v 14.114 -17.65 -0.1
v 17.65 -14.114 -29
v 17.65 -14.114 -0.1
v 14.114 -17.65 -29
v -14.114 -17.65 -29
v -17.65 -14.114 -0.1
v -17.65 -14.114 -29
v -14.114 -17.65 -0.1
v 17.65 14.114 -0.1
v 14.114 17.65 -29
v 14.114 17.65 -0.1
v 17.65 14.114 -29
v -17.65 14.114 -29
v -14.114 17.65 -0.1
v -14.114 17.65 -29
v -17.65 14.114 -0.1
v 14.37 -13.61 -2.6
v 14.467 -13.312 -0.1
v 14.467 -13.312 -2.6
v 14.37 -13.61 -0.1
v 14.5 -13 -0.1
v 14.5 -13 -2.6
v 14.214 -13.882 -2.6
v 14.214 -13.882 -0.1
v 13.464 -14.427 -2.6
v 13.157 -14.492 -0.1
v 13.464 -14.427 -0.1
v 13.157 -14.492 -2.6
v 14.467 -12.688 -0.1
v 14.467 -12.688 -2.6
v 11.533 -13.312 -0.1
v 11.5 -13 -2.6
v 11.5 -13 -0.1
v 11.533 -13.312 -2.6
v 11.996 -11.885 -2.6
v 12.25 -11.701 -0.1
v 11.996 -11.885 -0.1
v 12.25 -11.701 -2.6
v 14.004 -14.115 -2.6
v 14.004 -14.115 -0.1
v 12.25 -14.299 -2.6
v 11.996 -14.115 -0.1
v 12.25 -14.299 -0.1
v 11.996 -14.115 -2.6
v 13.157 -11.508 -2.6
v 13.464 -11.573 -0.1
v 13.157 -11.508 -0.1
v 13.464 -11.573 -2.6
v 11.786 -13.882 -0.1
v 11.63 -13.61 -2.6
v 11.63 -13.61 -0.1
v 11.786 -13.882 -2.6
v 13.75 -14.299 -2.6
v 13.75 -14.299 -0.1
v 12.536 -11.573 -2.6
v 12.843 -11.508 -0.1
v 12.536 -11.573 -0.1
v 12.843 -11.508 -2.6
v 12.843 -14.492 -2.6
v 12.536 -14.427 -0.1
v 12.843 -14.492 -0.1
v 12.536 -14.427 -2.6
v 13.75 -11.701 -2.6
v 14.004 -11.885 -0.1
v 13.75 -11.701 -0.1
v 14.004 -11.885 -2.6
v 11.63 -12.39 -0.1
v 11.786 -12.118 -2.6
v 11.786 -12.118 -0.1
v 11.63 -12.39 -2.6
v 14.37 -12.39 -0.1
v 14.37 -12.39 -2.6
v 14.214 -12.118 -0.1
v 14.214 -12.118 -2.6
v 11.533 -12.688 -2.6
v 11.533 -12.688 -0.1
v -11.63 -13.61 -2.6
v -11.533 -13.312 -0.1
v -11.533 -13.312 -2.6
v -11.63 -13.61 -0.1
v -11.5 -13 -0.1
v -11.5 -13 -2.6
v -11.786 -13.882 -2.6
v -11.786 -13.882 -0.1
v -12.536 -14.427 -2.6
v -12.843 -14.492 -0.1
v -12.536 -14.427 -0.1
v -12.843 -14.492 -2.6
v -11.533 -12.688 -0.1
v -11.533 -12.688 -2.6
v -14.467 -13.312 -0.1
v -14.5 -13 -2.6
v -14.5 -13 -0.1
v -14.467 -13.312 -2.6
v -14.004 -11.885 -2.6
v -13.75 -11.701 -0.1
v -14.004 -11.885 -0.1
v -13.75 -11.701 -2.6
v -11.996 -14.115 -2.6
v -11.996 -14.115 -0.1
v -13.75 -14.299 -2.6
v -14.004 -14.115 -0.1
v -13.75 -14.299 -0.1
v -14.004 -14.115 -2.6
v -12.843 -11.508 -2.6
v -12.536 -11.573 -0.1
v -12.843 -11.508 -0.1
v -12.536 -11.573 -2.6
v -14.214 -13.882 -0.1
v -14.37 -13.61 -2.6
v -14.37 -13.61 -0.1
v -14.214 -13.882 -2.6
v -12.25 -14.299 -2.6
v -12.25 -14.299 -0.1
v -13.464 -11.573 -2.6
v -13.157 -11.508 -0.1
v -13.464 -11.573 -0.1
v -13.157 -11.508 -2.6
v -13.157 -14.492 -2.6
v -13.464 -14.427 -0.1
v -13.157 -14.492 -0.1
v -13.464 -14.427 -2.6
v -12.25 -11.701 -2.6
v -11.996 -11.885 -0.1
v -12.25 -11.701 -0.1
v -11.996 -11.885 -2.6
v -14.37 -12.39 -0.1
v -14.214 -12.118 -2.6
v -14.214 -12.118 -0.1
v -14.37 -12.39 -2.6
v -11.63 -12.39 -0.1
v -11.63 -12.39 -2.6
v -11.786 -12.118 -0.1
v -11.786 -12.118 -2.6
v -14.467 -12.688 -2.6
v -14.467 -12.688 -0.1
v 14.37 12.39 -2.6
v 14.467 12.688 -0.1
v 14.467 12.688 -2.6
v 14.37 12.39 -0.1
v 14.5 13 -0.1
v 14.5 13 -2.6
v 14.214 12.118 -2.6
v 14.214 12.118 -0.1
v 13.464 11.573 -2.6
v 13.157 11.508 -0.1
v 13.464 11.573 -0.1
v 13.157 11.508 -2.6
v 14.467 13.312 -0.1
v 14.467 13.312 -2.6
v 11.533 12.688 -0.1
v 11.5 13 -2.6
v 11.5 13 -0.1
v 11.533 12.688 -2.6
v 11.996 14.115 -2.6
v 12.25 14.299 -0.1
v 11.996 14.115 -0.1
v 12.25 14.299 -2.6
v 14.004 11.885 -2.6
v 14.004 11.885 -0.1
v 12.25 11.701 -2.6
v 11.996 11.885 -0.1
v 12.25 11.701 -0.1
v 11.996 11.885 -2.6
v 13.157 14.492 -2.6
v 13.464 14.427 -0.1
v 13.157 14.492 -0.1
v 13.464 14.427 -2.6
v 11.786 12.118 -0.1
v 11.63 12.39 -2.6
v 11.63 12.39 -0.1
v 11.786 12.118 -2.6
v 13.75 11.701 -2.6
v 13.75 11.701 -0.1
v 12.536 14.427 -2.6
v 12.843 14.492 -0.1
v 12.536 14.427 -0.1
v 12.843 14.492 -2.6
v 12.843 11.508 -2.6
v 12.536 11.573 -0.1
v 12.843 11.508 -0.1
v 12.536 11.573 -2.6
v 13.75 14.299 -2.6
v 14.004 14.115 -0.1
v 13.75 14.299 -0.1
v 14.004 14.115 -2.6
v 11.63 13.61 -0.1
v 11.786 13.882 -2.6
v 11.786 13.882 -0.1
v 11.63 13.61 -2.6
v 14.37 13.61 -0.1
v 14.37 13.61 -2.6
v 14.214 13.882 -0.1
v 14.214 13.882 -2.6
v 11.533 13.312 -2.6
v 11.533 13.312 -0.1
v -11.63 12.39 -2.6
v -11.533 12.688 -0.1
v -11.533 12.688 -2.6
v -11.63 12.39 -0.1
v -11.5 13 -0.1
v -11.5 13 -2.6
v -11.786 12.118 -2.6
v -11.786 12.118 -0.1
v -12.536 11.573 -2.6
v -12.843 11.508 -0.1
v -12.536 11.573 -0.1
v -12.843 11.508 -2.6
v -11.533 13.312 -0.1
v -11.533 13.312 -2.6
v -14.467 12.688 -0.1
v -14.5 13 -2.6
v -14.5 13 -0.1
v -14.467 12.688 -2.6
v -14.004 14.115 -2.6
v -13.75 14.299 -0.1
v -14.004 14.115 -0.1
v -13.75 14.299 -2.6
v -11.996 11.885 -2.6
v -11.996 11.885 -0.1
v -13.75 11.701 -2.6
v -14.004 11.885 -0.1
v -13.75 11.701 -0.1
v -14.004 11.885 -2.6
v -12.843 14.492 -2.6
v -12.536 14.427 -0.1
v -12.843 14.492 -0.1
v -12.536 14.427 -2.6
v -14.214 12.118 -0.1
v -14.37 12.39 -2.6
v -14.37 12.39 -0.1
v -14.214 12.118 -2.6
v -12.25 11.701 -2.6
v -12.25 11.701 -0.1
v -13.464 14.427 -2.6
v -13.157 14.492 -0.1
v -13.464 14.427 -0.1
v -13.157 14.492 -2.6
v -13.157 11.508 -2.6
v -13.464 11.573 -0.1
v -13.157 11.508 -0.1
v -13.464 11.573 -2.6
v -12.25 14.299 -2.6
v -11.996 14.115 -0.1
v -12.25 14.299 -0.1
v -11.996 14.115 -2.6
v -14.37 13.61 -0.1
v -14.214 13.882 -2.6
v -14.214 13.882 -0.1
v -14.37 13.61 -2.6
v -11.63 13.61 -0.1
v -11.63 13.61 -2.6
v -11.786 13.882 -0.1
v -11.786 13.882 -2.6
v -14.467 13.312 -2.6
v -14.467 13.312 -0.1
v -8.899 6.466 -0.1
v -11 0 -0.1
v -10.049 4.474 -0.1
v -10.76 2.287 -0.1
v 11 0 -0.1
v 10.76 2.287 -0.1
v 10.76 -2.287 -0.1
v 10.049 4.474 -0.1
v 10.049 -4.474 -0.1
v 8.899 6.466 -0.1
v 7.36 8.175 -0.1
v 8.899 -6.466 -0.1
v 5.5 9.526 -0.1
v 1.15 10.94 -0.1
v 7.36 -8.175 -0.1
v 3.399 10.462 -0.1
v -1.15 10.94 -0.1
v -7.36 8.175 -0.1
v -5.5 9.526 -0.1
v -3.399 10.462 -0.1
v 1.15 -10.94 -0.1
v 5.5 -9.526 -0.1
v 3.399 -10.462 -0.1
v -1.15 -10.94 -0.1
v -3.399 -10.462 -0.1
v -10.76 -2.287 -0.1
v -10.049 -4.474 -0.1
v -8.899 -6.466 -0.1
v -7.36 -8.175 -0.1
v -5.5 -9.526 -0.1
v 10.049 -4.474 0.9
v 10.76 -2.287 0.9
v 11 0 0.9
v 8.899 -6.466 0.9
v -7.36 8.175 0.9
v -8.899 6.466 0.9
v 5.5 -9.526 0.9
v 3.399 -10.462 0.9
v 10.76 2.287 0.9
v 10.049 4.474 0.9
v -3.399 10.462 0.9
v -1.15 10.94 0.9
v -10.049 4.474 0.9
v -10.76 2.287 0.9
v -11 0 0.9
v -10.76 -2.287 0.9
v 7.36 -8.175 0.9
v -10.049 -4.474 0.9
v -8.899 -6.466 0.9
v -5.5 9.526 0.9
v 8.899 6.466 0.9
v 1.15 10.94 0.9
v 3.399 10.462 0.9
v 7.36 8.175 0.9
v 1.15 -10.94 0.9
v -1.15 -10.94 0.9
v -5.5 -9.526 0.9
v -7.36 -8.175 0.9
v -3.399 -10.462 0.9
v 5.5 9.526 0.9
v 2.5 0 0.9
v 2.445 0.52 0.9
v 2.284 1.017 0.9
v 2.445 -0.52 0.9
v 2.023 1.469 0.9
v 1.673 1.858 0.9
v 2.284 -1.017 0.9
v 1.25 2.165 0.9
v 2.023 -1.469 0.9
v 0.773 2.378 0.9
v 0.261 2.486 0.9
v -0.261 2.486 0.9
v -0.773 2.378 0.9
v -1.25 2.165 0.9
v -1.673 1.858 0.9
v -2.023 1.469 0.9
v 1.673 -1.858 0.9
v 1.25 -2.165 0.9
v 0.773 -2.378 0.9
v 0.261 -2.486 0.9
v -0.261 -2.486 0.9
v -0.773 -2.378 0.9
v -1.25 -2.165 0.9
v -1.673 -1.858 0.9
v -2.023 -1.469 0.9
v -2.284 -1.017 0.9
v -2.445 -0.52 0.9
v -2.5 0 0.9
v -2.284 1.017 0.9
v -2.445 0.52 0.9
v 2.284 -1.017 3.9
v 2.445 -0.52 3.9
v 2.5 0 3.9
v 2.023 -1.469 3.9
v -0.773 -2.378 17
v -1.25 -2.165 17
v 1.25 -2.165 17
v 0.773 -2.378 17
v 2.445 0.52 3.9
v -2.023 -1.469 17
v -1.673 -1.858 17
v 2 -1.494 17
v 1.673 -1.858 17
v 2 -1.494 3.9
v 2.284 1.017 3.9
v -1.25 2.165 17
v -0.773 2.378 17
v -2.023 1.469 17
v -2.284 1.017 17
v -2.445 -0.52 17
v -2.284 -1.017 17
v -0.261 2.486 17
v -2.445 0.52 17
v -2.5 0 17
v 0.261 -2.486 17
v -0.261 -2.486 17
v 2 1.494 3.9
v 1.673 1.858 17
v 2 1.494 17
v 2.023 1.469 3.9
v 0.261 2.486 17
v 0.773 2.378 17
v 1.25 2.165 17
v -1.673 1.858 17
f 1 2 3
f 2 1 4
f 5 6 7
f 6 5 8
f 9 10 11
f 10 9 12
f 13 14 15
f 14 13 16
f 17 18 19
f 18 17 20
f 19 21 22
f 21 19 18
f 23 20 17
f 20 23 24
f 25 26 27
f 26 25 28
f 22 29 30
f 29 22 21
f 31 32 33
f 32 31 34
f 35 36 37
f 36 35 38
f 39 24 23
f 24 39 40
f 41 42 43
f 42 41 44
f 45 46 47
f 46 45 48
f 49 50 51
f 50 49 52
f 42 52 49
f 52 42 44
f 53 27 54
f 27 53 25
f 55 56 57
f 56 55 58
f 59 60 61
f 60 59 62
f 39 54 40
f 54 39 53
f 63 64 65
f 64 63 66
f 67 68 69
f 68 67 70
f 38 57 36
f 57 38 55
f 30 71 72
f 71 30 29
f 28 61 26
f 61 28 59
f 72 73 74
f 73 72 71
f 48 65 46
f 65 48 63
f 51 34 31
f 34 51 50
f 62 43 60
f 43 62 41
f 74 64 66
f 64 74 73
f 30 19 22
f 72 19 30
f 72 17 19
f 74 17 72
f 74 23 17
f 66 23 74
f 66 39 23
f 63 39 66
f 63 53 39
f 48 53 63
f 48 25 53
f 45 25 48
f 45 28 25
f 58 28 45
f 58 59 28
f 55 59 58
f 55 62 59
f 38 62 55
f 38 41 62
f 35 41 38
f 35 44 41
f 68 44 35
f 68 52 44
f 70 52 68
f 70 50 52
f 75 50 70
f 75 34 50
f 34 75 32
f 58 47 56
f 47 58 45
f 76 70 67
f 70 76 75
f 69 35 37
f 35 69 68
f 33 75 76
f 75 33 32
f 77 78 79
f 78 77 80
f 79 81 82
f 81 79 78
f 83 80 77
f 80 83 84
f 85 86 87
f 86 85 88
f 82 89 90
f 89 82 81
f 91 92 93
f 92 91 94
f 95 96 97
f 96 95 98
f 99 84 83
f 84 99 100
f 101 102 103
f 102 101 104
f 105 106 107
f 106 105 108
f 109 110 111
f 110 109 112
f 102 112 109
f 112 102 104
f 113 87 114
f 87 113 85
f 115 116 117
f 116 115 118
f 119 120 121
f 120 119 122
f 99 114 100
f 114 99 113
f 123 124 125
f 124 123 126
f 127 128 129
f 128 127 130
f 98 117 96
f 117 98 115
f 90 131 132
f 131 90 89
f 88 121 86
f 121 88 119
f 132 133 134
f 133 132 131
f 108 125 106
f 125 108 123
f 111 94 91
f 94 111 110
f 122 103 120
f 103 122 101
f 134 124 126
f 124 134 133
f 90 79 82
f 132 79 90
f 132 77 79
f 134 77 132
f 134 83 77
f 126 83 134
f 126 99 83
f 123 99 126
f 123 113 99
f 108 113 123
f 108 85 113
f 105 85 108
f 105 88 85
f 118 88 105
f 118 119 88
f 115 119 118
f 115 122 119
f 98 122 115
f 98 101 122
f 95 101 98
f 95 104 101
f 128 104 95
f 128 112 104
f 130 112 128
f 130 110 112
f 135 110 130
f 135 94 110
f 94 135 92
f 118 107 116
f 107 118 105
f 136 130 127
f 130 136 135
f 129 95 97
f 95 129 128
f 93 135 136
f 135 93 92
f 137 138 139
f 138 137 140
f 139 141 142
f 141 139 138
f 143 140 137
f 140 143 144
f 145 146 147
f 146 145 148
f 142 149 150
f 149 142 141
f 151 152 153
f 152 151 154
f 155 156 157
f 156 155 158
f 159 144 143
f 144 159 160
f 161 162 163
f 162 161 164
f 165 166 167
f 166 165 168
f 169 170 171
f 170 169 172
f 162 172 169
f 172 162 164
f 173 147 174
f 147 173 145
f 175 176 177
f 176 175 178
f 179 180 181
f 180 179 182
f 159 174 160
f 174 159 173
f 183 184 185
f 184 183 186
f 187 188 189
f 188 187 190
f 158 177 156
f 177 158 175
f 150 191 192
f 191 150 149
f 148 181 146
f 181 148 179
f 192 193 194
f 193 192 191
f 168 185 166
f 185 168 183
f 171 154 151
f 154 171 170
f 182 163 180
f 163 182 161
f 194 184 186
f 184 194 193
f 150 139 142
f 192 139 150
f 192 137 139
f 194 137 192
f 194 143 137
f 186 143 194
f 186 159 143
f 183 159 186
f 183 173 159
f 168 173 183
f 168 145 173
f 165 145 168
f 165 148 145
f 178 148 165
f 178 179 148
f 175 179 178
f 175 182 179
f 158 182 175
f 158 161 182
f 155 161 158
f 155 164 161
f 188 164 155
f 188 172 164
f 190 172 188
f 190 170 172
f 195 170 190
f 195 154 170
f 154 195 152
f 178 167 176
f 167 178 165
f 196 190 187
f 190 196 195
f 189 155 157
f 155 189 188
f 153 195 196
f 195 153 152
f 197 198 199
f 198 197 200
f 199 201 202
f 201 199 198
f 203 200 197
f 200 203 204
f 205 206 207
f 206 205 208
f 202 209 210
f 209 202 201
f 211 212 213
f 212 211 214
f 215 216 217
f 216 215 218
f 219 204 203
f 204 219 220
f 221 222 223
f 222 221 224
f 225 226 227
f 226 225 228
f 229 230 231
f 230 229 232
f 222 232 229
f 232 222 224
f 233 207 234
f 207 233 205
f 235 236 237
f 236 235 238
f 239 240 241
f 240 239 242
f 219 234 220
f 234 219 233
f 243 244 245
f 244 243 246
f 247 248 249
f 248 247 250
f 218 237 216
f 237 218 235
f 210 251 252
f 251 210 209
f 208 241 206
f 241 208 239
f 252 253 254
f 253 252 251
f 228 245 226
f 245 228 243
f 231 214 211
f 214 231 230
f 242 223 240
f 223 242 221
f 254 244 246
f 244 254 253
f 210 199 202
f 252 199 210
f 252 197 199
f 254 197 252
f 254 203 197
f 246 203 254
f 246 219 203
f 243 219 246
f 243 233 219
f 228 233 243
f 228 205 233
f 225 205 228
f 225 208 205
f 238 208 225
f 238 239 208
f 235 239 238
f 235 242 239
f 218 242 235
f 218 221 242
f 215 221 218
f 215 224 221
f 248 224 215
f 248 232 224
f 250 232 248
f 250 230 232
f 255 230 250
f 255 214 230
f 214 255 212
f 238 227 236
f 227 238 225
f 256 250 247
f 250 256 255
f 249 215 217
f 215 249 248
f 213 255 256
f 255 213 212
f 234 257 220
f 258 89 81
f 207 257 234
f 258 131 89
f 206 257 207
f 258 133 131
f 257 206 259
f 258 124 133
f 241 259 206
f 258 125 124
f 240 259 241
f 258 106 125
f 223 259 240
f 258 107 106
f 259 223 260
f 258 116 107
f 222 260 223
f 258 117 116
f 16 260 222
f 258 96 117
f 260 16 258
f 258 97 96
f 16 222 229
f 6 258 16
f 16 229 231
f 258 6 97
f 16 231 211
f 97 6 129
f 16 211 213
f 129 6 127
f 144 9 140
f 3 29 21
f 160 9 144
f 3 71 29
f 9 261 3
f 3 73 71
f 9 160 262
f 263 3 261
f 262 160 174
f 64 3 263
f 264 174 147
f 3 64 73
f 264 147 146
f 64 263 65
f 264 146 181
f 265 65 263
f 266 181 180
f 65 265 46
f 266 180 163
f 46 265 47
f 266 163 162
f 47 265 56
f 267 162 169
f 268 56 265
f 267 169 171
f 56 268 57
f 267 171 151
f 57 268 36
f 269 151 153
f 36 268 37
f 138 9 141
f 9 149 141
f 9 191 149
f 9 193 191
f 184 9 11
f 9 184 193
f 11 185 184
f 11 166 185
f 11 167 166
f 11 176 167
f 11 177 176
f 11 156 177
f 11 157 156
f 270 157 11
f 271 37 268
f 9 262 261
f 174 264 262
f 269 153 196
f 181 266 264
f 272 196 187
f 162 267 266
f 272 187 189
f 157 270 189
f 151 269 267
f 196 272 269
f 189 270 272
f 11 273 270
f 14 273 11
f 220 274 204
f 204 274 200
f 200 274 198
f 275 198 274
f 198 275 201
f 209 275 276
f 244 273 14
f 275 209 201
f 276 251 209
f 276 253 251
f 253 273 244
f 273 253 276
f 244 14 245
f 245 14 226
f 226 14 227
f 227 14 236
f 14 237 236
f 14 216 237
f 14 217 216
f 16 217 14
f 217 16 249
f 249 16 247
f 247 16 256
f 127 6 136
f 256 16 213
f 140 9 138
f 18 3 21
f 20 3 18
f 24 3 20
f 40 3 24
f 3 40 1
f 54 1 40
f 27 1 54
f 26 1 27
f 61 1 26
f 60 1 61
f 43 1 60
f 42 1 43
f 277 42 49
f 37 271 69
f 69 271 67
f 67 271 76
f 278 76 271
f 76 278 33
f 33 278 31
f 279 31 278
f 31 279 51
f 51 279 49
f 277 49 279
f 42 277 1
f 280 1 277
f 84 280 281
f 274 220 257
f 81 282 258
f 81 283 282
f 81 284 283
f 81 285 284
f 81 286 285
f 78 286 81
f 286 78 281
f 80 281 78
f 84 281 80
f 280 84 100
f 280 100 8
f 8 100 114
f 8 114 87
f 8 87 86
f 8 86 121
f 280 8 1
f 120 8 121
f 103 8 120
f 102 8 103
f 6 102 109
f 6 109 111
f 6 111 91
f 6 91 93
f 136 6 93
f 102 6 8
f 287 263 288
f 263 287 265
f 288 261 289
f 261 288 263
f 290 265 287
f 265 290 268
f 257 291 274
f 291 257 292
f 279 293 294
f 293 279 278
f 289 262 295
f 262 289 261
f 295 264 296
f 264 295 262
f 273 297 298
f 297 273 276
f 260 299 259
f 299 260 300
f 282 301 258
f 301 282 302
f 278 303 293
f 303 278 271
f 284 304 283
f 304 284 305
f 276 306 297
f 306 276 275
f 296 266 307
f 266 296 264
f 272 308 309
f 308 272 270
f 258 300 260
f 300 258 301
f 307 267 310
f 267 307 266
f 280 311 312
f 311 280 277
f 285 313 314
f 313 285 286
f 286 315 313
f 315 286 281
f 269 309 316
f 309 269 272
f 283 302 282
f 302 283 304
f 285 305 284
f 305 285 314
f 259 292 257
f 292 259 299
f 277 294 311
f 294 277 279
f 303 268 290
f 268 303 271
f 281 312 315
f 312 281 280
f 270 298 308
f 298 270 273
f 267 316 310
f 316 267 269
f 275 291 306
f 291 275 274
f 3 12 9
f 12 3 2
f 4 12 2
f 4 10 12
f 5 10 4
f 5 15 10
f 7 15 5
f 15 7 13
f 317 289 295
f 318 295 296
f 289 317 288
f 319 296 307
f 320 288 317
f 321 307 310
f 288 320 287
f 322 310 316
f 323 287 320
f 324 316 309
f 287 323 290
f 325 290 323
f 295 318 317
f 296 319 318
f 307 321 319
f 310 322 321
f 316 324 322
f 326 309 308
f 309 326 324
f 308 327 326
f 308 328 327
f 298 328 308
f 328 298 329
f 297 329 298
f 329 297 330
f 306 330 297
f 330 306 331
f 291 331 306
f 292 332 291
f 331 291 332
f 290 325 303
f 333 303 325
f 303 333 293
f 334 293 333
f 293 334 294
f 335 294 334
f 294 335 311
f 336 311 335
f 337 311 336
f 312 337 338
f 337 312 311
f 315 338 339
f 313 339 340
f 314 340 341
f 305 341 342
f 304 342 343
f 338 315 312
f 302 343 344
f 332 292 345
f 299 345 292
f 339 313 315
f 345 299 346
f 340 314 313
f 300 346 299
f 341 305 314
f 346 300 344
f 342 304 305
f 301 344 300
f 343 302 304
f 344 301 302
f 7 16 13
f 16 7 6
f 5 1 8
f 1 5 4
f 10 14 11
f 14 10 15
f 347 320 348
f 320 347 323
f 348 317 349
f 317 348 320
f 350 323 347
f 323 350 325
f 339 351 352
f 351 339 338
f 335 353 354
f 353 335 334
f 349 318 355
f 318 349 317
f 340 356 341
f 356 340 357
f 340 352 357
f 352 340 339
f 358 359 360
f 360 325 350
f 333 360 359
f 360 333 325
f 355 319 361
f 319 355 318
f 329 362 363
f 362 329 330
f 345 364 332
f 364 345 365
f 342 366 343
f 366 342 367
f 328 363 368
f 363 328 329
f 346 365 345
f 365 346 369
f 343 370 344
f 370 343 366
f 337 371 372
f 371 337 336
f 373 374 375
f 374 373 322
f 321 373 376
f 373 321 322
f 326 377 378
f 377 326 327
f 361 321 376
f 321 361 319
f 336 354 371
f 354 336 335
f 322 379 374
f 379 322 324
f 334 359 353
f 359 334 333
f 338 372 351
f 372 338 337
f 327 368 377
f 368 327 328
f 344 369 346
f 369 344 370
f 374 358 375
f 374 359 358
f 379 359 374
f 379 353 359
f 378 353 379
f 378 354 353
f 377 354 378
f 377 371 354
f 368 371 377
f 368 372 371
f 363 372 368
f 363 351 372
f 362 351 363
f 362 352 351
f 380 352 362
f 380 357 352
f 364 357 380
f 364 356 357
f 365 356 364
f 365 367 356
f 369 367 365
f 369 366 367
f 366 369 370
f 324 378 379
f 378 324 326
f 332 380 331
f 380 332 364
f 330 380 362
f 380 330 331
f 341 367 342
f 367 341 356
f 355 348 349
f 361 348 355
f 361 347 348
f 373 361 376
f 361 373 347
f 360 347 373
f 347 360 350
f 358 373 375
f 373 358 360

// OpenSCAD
// NAME: Nema 14 Motor
// CATEGORY: Motor
// COLOR: 493

include <MCAD/stepper.scad>
motor(Nema14, pos=[0, 0, 0.9], orientation=[180, 0, 0]);
